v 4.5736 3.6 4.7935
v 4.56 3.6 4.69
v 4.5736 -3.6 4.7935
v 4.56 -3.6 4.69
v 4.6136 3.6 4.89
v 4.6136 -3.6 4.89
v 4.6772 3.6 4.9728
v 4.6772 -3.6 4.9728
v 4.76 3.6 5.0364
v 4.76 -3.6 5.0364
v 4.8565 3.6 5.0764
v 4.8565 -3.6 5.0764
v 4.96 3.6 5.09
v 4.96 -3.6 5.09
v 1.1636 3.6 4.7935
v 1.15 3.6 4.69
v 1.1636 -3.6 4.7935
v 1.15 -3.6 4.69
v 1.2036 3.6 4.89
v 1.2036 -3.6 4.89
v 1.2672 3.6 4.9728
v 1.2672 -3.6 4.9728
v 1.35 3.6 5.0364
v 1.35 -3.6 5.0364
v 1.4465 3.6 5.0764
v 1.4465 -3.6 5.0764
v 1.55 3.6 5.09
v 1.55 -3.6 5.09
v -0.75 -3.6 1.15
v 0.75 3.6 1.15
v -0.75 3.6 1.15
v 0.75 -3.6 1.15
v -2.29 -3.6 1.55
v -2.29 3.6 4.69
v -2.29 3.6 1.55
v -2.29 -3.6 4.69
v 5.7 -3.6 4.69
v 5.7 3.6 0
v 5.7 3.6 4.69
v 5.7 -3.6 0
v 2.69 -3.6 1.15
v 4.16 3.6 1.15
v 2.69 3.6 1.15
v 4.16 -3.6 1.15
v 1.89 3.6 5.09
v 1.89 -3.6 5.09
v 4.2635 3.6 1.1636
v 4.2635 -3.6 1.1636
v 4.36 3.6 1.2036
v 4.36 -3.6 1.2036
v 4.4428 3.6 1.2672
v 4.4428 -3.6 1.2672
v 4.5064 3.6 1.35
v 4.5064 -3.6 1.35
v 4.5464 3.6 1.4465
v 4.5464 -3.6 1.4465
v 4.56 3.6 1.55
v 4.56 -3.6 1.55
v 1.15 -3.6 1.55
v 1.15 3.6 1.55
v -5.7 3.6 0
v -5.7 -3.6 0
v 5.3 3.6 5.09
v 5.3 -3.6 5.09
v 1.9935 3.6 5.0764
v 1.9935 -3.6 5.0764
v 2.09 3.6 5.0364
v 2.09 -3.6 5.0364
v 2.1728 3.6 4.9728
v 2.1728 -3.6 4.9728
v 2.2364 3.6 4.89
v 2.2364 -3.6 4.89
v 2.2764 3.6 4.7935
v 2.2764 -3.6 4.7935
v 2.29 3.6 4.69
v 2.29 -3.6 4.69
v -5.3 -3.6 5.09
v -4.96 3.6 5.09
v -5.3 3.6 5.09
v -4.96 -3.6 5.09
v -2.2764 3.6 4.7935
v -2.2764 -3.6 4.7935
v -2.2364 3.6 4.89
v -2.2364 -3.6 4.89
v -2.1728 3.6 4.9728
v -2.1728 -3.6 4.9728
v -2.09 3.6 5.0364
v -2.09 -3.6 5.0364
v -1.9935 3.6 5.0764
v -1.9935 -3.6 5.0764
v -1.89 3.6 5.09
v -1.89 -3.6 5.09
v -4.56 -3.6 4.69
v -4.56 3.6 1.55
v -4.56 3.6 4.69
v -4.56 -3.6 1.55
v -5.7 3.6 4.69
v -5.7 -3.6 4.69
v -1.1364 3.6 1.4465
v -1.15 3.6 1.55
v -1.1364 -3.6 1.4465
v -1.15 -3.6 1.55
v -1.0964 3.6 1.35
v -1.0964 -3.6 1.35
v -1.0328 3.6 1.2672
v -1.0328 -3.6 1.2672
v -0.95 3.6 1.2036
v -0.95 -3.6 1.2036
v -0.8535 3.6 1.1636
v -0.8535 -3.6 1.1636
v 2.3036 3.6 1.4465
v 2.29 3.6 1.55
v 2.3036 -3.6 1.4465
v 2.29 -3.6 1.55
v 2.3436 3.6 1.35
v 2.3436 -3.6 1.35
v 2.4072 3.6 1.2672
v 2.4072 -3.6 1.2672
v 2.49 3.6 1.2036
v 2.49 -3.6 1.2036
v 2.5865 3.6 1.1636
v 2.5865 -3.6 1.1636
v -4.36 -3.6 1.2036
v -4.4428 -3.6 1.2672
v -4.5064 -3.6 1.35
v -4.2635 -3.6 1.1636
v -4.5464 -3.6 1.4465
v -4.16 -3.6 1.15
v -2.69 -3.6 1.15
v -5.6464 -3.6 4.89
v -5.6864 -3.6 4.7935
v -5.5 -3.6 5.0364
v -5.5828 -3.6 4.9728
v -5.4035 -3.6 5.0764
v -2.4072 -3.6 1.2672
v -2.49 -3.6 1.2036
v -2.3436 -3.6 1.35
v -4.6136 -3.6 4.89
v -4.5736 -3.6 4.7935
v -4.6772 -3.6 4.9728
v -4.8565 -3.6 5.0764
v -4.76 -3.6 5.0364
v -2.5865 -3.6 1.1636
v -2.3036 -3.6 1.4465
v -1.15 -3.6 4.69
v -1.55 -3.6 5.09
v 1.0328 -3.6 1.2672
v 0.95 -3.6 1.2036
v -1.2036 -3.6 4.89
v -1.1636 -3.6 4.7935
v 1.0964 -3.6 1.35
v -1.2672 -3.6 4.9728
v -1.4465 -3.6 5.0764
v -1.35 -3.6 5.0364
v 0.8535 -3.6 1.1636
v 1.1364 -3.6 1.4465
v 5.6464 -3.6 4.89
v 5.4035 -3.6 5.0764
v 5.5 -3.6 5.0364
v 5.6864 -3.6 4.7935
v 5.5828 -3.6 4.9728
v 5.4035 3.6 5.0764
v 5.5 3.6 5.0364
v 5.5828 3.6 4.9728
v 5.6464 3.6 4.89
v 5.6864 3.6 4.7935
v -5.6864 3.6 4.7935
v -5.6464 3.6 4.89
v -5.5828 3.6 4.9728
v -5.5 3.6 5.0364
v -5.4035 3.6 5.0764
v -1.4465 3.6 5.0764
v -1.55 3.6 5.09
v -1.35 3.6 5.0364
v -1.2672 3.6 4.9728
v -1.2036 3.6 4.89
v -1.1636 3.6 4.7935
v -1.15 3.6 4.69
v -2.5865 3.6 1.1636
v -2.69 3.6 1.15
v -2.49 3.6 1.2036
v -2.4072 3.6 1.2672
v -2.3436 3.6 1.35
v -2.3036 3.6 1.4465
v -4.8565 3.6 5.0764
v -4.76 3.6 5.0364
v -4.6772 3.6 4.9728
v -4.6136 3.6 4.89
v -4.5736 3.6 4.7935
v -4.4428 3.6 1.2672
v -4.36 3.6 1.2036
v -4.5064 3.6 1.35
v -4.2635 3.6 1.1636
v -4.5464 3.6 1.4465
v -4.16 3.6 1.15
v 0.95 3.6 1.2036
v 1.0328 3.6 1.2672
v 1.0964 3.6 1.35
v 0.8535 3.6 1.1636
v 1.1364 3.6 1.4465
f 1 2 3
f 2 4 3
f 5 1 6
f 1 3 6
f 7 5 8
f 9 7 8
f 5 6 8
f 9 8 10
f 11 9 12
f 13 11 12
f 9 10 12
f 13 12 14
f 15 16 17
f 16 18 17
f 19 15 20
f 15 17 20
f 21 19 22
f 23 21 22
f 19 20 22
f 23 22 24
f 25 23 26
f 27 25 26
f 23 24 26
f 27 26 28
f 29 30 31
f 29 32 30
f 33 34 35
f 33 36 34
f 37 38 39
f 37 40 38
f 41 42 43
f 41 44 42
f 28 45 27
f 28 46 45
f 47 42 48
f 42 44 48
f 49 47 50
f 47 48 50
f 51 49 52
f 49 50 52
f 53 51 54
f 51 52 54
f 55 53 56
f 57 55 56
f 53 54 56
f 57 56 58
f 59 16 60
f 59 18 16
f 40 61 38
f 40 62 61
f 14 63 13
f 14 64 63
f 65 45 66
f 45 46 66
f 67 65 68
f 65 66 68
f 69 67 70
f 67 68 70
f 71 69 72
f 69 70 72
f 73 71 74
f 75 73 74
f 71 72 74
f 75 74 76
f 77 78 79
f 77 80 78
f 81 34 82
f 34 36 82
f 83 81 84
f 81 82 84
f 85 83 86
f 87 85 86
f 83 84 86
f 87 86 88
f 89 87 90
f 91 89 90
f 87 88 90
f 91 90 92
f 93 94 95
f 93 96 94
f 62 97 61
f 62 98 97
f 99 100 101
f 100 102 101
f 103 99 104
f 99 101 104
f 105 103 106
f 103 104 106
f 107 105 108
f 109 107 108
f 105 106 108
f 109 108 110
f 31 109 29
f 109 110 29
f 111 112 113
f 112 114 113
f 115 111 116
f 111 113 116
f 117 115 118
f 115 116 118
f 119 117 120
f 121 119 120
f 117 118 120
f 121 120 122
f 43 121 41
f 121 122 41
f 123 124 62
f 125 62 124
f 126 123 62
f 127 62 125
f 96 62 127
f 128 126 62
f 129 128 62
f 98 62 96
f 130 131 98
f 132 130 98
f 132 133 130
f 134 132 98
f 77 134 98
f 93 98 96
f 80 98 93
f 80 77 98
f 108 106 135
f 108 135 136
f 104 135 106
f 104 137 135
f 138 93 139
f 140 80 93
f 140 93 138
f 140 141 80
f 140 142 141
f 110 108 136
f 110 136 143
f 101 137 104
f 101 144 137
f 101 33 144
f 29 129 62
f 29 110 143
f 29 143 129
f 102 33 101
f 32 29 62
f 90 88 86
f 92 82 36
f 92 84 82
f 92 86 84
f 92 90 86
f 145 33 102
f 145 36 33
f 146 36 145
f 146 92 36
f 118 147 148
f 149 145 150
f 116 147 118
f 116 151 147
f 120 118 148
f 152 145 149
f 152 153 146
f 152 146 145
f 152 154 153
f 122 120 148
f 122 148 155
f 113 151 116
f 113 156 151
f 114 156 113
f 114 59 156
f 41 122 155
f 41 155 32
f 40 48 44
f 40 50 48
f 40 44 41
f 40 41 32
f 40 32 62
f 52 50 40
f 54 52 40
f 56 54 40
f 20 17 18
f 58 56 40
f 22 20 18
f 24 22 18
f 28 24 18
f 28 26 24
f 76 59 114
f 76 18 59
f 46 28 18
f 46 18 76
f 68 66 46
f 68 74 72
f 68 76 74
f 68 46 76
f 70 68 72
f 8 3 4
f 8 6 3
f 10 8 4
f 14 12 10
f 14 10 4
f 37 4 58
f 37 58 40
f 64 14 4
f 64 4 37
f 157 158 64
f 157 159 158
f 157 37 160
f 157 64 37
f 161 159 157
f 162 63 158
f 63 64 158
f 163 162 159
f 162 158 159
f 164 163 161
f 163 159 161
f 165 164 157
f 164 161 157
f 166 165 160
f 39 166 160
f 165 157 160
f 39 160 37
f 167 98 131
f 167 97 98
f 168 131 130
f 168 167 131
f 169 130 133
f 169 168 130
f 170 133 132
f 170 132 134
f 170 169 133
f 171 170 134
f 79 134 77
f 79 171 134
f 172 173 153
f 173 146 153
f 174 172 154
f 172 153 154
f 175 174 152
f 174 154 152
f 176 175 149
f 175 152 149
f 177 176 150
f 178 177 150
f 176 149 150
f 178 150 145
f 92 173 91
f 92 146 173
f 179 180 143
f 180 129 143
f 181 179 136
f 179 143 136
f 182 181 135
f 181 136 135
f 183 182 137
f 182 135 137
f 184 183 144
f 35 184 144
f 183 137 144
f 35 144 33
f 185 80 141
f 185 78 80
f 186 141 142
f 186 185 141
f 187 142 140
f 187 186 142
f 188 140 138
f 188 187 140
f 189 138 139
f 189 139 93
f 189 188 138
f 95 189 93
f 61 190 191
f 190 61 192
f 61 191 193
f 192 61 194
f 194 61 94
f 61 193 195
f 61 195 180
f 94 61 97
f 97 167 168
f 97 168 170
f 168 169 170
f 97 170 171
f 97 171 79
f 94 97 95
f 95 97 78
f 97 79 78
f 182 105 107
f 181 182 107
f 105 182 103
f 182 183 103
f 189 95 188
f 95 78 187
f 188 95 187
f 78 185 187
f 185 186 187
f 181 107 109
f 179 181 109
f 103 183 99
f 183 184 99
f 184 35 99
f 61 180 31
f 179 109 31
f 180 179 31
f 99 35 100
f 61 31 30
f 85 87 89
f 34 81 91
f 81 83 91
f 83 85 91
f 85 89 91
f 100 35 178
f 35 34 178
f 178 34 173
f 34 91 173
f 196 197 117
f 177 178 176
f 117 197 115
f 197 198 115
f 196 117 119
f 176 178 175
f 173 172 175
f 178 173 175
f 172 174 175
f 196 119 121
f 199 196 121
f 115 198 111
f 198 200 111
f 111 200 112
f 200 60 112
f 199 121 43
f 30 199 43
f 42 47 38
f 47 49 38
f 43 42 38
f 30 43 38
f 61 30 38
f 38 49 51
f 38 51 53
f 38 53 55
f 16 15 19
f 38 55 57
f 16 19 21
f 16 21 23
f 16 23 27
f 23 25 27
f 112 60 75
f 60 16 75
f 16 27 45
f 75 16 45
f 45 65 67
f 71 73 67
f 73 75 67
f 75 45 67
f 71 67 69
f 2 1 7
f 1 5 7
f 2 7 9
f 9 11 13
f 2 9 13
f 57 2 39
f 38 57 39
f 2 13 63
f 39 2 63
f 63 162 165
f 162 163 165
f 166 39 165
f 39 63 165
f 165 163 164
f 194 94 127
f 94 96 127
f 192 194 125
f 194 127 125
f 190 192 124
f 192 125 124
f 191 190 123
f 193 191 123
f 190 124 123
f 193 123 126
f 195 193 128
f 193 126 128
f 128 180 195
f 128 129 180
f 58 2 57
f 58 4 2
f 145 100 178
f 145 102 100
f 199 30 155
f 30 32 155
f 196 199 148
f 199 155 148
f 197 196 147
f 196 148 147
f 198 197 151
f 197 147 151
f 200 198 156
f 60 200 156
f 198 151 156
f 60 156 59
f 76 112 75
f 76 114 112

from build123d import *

# Parameters (mm, degrees)
PAD_DEPTH = 3.6
FILLET_R  = 0.4


with BuildPart() as part:
    # Sketch → Pad (new body, symmetric)
    with BuildSketch(Plane.XZ):
        Polygon((-5.7, 0), (5.7, 0), (5.7, 5.09), (4.56, 5.09), (4.56, 1.15), (2.29, 1.15), (2.29, 5.09), (1.15, 5.09), (1.15, 1.15), (-1.15, 1.15), (-1.15, 5.09), (-2.29, 5.09), (-2.29, 1.15), (-4.56, 1.15), (-4.56, 5.09), (-5.7, 5.09), align=None)
    extrude(amount=PAD_DEPTH, both=True)

    # Fillet
    fillet_edges = [part.edges().sort_by_distance(p)[0] for p in [
        (-5.7, 0, 5.09),
        (-4.56, 0, 5.09),
        (-2.29, 0, 5.09),
        (-1.15, 0, 5.09),
        (1.15, 0, 5.09),
        (2.29, 0, 5.09),
        (4.56, 0, 5.09),
        (5.7, 0, 5.09),
        (-4.56, 0, 1.15),
        (-1.15, 0, 1.15),
        (2.29, 0, 1.15),
        (-2.29, 0, 1.15),
        (1.15, 0, 1.15),
        (4.56, 0, 1.15),
    ]]
    fillet(fillet_edges, radius=FILLET_R)


solid = part.part
